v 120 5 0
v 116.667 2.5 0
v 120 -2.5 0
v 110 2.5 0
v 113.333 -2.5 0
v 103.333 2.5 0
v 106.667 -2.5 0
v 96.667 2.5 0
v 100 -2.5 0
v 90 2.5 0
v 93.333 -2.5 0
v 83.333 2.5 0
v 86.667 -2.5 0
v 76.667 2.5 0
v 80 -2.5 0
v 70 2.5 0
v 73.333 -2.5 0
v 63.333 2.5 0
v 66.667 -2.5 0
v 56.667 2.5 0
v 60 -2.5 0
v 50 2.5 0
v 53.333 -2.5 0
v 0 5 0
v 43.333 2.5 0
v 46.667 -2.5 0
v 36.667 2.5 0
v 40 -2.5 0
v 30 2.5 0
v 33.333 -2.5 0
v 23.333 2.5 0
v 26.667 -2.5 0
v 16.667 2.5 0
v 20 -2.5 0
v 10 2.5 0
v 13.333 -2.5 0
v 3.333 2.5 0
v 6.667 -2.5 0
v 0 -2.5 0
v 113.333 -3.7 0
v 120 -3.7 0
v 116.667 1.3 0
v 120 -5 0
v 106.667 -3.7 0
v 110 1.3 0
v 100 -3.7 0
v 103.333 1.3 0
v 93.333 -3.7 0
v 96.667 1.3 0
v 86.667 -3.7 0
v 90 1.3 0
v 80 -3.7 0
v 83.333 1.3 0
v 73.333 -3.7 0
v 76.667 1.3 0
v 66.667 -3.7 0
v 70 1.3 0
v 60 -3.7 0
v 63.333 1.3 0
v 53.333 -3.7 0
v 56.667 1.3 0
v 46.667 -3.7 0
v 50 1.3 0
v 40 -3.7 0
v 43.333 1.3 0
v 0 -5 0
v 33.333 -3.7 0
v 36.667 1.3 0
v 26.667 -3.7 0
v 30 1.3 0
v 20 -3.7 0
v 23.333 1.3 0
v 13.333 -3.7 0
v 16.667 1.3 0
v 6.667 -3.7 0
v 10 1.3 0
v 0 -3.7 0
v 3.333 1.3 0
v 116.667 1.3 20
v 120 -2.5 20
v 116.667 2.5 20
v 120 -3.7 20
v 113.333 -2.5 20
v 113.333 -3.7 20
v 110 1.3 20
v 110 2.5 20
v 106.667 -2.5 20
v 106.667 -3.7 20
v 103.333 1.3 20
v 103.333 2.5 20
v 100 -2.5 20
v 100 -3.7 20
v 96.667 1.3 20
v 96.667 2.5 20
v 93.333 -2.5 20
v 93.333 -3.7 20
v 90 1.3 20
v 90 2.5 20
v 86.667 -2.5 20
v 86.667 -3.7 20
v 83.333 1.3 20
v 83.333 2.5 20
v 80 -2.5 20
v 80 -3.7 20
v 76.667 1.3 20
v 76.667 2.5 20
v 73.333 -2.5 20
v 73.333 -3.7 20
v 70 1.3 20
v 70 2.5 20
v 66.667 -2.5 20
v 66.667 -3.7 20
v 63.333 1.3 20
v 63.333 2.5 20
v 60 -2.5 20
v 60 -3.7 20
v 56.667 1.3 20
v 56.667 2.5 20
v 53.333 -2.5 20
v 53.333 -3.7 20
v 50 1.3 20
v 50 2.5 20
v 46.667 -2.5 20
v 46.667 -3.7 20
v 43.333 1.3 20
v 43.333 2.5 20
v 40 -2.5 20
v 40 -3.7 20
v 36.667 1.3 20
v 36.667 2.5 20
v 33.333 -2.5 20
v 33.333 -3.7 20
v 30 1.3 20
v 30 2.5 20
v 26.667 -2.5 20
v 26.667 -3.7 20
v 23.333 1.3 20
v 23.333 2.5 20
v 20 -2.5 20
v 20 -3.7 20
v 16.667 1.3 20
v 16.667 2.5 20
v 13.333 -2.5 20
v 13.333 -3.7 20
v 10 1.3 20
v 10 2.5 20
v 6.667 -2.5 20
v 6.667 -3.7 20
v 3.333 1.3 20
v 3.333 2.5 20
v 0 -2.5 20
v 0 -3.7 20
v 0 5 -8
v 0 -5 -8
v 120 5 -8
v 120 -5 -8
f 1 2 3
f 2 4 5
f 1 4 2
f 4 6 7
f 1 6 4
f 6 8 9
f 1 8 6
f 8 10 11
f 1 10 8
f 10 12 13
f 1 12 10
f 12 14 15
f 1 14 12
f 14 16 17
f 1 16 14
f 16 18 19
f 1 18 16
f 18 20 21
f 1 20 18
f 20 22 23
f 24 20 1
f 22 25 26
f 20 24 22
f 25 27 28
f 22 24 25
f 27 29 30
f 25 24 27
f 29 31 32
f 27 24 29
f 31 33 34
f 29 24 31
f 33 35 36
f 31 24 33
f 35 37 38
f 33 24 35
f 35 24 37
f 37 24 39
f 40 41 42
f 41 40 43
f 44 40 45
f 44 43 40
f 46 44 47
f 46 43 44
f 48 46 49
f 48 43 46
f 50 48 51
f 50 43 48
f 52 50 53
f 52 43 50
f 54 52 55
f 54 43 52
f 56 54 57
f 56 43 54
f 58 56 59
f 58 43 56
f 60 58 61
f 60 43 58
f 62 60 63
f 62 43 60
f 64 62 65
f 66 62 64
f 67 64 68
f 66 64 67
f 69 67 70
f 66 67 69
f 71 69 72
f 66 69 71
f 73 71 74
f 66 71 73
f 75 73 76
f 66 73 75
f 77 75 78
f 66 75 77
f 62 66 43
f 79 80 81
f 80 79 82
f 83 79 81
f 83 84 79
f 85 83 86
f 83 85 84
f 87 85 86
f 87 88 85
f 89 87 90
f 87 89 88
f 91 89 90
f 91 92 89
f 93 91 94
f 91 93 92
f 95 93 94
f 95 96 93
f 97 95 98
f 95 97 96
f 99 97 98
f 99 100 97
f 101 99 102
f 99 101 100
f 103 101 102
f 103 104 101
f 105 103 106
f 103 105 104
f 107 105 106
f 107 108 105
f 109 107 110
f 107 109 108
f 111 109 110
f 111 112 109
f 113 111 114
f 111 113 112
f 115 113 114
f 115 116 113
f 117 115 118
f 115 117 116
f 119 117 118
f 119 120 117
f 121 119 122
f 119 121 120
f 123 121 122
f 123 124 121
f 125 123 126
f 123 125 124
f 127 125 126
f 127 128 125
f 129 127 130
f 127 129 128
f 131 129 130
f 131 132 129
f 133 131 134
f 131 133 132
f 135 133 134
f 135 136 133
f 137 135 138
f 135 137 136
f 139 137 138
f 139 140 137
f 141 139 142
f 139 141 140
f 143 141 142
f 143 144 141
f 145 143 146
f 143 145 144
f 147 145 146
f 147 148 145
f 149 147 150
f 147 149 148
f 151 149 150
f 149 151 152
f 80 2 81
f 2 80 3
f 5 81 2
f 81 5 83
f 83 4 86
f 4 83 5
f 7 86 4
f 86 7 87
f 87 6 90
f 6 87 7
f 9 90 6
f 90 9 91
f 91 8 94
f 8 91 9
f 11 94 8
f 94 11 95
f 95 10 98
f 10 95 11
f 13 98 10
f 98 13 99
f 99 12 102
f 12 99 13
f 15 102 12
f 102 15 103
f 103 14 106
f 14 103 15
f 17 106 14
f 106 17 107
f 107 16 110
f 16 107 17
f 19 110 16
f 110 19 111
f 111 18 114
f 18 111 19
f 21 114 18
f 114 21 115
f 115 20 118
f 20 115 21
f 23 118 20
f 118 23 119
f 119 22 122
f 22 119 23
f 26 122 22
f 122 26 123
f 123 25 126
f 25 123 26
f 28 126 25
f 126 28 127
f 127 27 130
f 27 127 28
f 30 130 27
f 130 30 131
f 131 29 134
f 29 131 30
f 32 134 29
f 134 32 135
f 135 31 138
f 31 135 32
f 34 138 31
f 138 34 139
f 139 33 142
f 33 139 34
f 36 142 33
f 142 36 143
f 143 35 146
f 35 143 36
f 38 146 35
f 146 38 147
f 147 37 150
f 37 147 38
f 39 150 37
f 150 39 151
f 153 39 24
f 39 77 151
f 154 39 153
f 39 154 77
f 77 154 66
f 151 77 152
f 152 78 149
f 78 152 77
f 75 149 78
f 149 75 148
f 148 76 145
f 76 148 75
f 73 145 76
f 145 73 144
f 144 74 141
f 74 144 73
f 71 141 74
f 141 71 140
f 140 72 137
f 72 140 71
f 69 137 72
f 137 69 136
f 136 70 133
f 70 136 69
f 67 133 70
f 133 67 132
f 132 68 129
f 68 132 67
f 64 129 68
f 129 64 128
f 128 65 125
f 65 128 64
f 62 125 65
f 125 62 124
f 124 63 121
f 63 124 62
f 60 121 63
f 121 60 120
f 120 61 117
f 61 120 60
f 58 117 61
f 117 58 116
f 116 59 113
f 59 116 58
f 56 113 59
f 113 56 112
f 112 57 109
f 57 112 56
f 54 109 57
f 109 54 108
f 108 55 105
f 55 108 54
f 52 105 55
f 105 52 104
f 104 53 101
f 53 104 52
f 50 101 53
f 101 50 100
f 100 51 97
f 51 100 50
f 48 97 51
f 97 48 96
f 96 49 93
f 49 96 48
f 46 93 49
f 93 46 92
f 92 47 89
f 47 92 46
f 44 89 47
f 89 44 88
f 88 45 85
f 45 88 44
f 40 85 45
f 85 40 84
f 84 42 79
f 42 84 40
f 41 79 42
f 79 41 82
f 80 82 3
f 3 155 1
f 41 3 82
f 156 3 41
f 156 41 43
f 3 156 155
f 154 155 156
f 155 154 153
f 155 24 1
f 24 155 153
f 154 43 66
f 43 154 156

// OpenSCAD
// file: common.scad
edge_thickness=1.2;
edge_height=20;
handle_thickness=10;
handle_height=8;

cutter_length=120;
cutter_height=edge_height+handle_height;
// main file
include <common.scad>


// waves 23 or 10
module ZigZagCutter(waves=18, amplitude=5) {
    // cube();
    wave_length=cutter_length/waves;
    half_wave_length=wave_length/2;
    half_amplitude = amplitude / 2;
    cutter_xy_points=[
        for (a=[0:waves*2]) [
            half_wave_length * a,
            a % 2 == 0 ? -half_amplitude : half_amplitude
        ],
        for (a=[0:waves*2]) [
            cutter_length - (half_wave_length * a),
            (a % 2 == 0 ? -half_amplitude : half_amplitude) - edge_thickness
        ]
    ];

    linear_extrude(edge_height) polygon(points=cutter_xy_points);
    translate([
        cutter_length/2,
        0,
        -handle_height/2,
    ]) cube([
        cutter_length, handle_thickness, handle_height
    ], center=true);
}


ZigZagCutter();
